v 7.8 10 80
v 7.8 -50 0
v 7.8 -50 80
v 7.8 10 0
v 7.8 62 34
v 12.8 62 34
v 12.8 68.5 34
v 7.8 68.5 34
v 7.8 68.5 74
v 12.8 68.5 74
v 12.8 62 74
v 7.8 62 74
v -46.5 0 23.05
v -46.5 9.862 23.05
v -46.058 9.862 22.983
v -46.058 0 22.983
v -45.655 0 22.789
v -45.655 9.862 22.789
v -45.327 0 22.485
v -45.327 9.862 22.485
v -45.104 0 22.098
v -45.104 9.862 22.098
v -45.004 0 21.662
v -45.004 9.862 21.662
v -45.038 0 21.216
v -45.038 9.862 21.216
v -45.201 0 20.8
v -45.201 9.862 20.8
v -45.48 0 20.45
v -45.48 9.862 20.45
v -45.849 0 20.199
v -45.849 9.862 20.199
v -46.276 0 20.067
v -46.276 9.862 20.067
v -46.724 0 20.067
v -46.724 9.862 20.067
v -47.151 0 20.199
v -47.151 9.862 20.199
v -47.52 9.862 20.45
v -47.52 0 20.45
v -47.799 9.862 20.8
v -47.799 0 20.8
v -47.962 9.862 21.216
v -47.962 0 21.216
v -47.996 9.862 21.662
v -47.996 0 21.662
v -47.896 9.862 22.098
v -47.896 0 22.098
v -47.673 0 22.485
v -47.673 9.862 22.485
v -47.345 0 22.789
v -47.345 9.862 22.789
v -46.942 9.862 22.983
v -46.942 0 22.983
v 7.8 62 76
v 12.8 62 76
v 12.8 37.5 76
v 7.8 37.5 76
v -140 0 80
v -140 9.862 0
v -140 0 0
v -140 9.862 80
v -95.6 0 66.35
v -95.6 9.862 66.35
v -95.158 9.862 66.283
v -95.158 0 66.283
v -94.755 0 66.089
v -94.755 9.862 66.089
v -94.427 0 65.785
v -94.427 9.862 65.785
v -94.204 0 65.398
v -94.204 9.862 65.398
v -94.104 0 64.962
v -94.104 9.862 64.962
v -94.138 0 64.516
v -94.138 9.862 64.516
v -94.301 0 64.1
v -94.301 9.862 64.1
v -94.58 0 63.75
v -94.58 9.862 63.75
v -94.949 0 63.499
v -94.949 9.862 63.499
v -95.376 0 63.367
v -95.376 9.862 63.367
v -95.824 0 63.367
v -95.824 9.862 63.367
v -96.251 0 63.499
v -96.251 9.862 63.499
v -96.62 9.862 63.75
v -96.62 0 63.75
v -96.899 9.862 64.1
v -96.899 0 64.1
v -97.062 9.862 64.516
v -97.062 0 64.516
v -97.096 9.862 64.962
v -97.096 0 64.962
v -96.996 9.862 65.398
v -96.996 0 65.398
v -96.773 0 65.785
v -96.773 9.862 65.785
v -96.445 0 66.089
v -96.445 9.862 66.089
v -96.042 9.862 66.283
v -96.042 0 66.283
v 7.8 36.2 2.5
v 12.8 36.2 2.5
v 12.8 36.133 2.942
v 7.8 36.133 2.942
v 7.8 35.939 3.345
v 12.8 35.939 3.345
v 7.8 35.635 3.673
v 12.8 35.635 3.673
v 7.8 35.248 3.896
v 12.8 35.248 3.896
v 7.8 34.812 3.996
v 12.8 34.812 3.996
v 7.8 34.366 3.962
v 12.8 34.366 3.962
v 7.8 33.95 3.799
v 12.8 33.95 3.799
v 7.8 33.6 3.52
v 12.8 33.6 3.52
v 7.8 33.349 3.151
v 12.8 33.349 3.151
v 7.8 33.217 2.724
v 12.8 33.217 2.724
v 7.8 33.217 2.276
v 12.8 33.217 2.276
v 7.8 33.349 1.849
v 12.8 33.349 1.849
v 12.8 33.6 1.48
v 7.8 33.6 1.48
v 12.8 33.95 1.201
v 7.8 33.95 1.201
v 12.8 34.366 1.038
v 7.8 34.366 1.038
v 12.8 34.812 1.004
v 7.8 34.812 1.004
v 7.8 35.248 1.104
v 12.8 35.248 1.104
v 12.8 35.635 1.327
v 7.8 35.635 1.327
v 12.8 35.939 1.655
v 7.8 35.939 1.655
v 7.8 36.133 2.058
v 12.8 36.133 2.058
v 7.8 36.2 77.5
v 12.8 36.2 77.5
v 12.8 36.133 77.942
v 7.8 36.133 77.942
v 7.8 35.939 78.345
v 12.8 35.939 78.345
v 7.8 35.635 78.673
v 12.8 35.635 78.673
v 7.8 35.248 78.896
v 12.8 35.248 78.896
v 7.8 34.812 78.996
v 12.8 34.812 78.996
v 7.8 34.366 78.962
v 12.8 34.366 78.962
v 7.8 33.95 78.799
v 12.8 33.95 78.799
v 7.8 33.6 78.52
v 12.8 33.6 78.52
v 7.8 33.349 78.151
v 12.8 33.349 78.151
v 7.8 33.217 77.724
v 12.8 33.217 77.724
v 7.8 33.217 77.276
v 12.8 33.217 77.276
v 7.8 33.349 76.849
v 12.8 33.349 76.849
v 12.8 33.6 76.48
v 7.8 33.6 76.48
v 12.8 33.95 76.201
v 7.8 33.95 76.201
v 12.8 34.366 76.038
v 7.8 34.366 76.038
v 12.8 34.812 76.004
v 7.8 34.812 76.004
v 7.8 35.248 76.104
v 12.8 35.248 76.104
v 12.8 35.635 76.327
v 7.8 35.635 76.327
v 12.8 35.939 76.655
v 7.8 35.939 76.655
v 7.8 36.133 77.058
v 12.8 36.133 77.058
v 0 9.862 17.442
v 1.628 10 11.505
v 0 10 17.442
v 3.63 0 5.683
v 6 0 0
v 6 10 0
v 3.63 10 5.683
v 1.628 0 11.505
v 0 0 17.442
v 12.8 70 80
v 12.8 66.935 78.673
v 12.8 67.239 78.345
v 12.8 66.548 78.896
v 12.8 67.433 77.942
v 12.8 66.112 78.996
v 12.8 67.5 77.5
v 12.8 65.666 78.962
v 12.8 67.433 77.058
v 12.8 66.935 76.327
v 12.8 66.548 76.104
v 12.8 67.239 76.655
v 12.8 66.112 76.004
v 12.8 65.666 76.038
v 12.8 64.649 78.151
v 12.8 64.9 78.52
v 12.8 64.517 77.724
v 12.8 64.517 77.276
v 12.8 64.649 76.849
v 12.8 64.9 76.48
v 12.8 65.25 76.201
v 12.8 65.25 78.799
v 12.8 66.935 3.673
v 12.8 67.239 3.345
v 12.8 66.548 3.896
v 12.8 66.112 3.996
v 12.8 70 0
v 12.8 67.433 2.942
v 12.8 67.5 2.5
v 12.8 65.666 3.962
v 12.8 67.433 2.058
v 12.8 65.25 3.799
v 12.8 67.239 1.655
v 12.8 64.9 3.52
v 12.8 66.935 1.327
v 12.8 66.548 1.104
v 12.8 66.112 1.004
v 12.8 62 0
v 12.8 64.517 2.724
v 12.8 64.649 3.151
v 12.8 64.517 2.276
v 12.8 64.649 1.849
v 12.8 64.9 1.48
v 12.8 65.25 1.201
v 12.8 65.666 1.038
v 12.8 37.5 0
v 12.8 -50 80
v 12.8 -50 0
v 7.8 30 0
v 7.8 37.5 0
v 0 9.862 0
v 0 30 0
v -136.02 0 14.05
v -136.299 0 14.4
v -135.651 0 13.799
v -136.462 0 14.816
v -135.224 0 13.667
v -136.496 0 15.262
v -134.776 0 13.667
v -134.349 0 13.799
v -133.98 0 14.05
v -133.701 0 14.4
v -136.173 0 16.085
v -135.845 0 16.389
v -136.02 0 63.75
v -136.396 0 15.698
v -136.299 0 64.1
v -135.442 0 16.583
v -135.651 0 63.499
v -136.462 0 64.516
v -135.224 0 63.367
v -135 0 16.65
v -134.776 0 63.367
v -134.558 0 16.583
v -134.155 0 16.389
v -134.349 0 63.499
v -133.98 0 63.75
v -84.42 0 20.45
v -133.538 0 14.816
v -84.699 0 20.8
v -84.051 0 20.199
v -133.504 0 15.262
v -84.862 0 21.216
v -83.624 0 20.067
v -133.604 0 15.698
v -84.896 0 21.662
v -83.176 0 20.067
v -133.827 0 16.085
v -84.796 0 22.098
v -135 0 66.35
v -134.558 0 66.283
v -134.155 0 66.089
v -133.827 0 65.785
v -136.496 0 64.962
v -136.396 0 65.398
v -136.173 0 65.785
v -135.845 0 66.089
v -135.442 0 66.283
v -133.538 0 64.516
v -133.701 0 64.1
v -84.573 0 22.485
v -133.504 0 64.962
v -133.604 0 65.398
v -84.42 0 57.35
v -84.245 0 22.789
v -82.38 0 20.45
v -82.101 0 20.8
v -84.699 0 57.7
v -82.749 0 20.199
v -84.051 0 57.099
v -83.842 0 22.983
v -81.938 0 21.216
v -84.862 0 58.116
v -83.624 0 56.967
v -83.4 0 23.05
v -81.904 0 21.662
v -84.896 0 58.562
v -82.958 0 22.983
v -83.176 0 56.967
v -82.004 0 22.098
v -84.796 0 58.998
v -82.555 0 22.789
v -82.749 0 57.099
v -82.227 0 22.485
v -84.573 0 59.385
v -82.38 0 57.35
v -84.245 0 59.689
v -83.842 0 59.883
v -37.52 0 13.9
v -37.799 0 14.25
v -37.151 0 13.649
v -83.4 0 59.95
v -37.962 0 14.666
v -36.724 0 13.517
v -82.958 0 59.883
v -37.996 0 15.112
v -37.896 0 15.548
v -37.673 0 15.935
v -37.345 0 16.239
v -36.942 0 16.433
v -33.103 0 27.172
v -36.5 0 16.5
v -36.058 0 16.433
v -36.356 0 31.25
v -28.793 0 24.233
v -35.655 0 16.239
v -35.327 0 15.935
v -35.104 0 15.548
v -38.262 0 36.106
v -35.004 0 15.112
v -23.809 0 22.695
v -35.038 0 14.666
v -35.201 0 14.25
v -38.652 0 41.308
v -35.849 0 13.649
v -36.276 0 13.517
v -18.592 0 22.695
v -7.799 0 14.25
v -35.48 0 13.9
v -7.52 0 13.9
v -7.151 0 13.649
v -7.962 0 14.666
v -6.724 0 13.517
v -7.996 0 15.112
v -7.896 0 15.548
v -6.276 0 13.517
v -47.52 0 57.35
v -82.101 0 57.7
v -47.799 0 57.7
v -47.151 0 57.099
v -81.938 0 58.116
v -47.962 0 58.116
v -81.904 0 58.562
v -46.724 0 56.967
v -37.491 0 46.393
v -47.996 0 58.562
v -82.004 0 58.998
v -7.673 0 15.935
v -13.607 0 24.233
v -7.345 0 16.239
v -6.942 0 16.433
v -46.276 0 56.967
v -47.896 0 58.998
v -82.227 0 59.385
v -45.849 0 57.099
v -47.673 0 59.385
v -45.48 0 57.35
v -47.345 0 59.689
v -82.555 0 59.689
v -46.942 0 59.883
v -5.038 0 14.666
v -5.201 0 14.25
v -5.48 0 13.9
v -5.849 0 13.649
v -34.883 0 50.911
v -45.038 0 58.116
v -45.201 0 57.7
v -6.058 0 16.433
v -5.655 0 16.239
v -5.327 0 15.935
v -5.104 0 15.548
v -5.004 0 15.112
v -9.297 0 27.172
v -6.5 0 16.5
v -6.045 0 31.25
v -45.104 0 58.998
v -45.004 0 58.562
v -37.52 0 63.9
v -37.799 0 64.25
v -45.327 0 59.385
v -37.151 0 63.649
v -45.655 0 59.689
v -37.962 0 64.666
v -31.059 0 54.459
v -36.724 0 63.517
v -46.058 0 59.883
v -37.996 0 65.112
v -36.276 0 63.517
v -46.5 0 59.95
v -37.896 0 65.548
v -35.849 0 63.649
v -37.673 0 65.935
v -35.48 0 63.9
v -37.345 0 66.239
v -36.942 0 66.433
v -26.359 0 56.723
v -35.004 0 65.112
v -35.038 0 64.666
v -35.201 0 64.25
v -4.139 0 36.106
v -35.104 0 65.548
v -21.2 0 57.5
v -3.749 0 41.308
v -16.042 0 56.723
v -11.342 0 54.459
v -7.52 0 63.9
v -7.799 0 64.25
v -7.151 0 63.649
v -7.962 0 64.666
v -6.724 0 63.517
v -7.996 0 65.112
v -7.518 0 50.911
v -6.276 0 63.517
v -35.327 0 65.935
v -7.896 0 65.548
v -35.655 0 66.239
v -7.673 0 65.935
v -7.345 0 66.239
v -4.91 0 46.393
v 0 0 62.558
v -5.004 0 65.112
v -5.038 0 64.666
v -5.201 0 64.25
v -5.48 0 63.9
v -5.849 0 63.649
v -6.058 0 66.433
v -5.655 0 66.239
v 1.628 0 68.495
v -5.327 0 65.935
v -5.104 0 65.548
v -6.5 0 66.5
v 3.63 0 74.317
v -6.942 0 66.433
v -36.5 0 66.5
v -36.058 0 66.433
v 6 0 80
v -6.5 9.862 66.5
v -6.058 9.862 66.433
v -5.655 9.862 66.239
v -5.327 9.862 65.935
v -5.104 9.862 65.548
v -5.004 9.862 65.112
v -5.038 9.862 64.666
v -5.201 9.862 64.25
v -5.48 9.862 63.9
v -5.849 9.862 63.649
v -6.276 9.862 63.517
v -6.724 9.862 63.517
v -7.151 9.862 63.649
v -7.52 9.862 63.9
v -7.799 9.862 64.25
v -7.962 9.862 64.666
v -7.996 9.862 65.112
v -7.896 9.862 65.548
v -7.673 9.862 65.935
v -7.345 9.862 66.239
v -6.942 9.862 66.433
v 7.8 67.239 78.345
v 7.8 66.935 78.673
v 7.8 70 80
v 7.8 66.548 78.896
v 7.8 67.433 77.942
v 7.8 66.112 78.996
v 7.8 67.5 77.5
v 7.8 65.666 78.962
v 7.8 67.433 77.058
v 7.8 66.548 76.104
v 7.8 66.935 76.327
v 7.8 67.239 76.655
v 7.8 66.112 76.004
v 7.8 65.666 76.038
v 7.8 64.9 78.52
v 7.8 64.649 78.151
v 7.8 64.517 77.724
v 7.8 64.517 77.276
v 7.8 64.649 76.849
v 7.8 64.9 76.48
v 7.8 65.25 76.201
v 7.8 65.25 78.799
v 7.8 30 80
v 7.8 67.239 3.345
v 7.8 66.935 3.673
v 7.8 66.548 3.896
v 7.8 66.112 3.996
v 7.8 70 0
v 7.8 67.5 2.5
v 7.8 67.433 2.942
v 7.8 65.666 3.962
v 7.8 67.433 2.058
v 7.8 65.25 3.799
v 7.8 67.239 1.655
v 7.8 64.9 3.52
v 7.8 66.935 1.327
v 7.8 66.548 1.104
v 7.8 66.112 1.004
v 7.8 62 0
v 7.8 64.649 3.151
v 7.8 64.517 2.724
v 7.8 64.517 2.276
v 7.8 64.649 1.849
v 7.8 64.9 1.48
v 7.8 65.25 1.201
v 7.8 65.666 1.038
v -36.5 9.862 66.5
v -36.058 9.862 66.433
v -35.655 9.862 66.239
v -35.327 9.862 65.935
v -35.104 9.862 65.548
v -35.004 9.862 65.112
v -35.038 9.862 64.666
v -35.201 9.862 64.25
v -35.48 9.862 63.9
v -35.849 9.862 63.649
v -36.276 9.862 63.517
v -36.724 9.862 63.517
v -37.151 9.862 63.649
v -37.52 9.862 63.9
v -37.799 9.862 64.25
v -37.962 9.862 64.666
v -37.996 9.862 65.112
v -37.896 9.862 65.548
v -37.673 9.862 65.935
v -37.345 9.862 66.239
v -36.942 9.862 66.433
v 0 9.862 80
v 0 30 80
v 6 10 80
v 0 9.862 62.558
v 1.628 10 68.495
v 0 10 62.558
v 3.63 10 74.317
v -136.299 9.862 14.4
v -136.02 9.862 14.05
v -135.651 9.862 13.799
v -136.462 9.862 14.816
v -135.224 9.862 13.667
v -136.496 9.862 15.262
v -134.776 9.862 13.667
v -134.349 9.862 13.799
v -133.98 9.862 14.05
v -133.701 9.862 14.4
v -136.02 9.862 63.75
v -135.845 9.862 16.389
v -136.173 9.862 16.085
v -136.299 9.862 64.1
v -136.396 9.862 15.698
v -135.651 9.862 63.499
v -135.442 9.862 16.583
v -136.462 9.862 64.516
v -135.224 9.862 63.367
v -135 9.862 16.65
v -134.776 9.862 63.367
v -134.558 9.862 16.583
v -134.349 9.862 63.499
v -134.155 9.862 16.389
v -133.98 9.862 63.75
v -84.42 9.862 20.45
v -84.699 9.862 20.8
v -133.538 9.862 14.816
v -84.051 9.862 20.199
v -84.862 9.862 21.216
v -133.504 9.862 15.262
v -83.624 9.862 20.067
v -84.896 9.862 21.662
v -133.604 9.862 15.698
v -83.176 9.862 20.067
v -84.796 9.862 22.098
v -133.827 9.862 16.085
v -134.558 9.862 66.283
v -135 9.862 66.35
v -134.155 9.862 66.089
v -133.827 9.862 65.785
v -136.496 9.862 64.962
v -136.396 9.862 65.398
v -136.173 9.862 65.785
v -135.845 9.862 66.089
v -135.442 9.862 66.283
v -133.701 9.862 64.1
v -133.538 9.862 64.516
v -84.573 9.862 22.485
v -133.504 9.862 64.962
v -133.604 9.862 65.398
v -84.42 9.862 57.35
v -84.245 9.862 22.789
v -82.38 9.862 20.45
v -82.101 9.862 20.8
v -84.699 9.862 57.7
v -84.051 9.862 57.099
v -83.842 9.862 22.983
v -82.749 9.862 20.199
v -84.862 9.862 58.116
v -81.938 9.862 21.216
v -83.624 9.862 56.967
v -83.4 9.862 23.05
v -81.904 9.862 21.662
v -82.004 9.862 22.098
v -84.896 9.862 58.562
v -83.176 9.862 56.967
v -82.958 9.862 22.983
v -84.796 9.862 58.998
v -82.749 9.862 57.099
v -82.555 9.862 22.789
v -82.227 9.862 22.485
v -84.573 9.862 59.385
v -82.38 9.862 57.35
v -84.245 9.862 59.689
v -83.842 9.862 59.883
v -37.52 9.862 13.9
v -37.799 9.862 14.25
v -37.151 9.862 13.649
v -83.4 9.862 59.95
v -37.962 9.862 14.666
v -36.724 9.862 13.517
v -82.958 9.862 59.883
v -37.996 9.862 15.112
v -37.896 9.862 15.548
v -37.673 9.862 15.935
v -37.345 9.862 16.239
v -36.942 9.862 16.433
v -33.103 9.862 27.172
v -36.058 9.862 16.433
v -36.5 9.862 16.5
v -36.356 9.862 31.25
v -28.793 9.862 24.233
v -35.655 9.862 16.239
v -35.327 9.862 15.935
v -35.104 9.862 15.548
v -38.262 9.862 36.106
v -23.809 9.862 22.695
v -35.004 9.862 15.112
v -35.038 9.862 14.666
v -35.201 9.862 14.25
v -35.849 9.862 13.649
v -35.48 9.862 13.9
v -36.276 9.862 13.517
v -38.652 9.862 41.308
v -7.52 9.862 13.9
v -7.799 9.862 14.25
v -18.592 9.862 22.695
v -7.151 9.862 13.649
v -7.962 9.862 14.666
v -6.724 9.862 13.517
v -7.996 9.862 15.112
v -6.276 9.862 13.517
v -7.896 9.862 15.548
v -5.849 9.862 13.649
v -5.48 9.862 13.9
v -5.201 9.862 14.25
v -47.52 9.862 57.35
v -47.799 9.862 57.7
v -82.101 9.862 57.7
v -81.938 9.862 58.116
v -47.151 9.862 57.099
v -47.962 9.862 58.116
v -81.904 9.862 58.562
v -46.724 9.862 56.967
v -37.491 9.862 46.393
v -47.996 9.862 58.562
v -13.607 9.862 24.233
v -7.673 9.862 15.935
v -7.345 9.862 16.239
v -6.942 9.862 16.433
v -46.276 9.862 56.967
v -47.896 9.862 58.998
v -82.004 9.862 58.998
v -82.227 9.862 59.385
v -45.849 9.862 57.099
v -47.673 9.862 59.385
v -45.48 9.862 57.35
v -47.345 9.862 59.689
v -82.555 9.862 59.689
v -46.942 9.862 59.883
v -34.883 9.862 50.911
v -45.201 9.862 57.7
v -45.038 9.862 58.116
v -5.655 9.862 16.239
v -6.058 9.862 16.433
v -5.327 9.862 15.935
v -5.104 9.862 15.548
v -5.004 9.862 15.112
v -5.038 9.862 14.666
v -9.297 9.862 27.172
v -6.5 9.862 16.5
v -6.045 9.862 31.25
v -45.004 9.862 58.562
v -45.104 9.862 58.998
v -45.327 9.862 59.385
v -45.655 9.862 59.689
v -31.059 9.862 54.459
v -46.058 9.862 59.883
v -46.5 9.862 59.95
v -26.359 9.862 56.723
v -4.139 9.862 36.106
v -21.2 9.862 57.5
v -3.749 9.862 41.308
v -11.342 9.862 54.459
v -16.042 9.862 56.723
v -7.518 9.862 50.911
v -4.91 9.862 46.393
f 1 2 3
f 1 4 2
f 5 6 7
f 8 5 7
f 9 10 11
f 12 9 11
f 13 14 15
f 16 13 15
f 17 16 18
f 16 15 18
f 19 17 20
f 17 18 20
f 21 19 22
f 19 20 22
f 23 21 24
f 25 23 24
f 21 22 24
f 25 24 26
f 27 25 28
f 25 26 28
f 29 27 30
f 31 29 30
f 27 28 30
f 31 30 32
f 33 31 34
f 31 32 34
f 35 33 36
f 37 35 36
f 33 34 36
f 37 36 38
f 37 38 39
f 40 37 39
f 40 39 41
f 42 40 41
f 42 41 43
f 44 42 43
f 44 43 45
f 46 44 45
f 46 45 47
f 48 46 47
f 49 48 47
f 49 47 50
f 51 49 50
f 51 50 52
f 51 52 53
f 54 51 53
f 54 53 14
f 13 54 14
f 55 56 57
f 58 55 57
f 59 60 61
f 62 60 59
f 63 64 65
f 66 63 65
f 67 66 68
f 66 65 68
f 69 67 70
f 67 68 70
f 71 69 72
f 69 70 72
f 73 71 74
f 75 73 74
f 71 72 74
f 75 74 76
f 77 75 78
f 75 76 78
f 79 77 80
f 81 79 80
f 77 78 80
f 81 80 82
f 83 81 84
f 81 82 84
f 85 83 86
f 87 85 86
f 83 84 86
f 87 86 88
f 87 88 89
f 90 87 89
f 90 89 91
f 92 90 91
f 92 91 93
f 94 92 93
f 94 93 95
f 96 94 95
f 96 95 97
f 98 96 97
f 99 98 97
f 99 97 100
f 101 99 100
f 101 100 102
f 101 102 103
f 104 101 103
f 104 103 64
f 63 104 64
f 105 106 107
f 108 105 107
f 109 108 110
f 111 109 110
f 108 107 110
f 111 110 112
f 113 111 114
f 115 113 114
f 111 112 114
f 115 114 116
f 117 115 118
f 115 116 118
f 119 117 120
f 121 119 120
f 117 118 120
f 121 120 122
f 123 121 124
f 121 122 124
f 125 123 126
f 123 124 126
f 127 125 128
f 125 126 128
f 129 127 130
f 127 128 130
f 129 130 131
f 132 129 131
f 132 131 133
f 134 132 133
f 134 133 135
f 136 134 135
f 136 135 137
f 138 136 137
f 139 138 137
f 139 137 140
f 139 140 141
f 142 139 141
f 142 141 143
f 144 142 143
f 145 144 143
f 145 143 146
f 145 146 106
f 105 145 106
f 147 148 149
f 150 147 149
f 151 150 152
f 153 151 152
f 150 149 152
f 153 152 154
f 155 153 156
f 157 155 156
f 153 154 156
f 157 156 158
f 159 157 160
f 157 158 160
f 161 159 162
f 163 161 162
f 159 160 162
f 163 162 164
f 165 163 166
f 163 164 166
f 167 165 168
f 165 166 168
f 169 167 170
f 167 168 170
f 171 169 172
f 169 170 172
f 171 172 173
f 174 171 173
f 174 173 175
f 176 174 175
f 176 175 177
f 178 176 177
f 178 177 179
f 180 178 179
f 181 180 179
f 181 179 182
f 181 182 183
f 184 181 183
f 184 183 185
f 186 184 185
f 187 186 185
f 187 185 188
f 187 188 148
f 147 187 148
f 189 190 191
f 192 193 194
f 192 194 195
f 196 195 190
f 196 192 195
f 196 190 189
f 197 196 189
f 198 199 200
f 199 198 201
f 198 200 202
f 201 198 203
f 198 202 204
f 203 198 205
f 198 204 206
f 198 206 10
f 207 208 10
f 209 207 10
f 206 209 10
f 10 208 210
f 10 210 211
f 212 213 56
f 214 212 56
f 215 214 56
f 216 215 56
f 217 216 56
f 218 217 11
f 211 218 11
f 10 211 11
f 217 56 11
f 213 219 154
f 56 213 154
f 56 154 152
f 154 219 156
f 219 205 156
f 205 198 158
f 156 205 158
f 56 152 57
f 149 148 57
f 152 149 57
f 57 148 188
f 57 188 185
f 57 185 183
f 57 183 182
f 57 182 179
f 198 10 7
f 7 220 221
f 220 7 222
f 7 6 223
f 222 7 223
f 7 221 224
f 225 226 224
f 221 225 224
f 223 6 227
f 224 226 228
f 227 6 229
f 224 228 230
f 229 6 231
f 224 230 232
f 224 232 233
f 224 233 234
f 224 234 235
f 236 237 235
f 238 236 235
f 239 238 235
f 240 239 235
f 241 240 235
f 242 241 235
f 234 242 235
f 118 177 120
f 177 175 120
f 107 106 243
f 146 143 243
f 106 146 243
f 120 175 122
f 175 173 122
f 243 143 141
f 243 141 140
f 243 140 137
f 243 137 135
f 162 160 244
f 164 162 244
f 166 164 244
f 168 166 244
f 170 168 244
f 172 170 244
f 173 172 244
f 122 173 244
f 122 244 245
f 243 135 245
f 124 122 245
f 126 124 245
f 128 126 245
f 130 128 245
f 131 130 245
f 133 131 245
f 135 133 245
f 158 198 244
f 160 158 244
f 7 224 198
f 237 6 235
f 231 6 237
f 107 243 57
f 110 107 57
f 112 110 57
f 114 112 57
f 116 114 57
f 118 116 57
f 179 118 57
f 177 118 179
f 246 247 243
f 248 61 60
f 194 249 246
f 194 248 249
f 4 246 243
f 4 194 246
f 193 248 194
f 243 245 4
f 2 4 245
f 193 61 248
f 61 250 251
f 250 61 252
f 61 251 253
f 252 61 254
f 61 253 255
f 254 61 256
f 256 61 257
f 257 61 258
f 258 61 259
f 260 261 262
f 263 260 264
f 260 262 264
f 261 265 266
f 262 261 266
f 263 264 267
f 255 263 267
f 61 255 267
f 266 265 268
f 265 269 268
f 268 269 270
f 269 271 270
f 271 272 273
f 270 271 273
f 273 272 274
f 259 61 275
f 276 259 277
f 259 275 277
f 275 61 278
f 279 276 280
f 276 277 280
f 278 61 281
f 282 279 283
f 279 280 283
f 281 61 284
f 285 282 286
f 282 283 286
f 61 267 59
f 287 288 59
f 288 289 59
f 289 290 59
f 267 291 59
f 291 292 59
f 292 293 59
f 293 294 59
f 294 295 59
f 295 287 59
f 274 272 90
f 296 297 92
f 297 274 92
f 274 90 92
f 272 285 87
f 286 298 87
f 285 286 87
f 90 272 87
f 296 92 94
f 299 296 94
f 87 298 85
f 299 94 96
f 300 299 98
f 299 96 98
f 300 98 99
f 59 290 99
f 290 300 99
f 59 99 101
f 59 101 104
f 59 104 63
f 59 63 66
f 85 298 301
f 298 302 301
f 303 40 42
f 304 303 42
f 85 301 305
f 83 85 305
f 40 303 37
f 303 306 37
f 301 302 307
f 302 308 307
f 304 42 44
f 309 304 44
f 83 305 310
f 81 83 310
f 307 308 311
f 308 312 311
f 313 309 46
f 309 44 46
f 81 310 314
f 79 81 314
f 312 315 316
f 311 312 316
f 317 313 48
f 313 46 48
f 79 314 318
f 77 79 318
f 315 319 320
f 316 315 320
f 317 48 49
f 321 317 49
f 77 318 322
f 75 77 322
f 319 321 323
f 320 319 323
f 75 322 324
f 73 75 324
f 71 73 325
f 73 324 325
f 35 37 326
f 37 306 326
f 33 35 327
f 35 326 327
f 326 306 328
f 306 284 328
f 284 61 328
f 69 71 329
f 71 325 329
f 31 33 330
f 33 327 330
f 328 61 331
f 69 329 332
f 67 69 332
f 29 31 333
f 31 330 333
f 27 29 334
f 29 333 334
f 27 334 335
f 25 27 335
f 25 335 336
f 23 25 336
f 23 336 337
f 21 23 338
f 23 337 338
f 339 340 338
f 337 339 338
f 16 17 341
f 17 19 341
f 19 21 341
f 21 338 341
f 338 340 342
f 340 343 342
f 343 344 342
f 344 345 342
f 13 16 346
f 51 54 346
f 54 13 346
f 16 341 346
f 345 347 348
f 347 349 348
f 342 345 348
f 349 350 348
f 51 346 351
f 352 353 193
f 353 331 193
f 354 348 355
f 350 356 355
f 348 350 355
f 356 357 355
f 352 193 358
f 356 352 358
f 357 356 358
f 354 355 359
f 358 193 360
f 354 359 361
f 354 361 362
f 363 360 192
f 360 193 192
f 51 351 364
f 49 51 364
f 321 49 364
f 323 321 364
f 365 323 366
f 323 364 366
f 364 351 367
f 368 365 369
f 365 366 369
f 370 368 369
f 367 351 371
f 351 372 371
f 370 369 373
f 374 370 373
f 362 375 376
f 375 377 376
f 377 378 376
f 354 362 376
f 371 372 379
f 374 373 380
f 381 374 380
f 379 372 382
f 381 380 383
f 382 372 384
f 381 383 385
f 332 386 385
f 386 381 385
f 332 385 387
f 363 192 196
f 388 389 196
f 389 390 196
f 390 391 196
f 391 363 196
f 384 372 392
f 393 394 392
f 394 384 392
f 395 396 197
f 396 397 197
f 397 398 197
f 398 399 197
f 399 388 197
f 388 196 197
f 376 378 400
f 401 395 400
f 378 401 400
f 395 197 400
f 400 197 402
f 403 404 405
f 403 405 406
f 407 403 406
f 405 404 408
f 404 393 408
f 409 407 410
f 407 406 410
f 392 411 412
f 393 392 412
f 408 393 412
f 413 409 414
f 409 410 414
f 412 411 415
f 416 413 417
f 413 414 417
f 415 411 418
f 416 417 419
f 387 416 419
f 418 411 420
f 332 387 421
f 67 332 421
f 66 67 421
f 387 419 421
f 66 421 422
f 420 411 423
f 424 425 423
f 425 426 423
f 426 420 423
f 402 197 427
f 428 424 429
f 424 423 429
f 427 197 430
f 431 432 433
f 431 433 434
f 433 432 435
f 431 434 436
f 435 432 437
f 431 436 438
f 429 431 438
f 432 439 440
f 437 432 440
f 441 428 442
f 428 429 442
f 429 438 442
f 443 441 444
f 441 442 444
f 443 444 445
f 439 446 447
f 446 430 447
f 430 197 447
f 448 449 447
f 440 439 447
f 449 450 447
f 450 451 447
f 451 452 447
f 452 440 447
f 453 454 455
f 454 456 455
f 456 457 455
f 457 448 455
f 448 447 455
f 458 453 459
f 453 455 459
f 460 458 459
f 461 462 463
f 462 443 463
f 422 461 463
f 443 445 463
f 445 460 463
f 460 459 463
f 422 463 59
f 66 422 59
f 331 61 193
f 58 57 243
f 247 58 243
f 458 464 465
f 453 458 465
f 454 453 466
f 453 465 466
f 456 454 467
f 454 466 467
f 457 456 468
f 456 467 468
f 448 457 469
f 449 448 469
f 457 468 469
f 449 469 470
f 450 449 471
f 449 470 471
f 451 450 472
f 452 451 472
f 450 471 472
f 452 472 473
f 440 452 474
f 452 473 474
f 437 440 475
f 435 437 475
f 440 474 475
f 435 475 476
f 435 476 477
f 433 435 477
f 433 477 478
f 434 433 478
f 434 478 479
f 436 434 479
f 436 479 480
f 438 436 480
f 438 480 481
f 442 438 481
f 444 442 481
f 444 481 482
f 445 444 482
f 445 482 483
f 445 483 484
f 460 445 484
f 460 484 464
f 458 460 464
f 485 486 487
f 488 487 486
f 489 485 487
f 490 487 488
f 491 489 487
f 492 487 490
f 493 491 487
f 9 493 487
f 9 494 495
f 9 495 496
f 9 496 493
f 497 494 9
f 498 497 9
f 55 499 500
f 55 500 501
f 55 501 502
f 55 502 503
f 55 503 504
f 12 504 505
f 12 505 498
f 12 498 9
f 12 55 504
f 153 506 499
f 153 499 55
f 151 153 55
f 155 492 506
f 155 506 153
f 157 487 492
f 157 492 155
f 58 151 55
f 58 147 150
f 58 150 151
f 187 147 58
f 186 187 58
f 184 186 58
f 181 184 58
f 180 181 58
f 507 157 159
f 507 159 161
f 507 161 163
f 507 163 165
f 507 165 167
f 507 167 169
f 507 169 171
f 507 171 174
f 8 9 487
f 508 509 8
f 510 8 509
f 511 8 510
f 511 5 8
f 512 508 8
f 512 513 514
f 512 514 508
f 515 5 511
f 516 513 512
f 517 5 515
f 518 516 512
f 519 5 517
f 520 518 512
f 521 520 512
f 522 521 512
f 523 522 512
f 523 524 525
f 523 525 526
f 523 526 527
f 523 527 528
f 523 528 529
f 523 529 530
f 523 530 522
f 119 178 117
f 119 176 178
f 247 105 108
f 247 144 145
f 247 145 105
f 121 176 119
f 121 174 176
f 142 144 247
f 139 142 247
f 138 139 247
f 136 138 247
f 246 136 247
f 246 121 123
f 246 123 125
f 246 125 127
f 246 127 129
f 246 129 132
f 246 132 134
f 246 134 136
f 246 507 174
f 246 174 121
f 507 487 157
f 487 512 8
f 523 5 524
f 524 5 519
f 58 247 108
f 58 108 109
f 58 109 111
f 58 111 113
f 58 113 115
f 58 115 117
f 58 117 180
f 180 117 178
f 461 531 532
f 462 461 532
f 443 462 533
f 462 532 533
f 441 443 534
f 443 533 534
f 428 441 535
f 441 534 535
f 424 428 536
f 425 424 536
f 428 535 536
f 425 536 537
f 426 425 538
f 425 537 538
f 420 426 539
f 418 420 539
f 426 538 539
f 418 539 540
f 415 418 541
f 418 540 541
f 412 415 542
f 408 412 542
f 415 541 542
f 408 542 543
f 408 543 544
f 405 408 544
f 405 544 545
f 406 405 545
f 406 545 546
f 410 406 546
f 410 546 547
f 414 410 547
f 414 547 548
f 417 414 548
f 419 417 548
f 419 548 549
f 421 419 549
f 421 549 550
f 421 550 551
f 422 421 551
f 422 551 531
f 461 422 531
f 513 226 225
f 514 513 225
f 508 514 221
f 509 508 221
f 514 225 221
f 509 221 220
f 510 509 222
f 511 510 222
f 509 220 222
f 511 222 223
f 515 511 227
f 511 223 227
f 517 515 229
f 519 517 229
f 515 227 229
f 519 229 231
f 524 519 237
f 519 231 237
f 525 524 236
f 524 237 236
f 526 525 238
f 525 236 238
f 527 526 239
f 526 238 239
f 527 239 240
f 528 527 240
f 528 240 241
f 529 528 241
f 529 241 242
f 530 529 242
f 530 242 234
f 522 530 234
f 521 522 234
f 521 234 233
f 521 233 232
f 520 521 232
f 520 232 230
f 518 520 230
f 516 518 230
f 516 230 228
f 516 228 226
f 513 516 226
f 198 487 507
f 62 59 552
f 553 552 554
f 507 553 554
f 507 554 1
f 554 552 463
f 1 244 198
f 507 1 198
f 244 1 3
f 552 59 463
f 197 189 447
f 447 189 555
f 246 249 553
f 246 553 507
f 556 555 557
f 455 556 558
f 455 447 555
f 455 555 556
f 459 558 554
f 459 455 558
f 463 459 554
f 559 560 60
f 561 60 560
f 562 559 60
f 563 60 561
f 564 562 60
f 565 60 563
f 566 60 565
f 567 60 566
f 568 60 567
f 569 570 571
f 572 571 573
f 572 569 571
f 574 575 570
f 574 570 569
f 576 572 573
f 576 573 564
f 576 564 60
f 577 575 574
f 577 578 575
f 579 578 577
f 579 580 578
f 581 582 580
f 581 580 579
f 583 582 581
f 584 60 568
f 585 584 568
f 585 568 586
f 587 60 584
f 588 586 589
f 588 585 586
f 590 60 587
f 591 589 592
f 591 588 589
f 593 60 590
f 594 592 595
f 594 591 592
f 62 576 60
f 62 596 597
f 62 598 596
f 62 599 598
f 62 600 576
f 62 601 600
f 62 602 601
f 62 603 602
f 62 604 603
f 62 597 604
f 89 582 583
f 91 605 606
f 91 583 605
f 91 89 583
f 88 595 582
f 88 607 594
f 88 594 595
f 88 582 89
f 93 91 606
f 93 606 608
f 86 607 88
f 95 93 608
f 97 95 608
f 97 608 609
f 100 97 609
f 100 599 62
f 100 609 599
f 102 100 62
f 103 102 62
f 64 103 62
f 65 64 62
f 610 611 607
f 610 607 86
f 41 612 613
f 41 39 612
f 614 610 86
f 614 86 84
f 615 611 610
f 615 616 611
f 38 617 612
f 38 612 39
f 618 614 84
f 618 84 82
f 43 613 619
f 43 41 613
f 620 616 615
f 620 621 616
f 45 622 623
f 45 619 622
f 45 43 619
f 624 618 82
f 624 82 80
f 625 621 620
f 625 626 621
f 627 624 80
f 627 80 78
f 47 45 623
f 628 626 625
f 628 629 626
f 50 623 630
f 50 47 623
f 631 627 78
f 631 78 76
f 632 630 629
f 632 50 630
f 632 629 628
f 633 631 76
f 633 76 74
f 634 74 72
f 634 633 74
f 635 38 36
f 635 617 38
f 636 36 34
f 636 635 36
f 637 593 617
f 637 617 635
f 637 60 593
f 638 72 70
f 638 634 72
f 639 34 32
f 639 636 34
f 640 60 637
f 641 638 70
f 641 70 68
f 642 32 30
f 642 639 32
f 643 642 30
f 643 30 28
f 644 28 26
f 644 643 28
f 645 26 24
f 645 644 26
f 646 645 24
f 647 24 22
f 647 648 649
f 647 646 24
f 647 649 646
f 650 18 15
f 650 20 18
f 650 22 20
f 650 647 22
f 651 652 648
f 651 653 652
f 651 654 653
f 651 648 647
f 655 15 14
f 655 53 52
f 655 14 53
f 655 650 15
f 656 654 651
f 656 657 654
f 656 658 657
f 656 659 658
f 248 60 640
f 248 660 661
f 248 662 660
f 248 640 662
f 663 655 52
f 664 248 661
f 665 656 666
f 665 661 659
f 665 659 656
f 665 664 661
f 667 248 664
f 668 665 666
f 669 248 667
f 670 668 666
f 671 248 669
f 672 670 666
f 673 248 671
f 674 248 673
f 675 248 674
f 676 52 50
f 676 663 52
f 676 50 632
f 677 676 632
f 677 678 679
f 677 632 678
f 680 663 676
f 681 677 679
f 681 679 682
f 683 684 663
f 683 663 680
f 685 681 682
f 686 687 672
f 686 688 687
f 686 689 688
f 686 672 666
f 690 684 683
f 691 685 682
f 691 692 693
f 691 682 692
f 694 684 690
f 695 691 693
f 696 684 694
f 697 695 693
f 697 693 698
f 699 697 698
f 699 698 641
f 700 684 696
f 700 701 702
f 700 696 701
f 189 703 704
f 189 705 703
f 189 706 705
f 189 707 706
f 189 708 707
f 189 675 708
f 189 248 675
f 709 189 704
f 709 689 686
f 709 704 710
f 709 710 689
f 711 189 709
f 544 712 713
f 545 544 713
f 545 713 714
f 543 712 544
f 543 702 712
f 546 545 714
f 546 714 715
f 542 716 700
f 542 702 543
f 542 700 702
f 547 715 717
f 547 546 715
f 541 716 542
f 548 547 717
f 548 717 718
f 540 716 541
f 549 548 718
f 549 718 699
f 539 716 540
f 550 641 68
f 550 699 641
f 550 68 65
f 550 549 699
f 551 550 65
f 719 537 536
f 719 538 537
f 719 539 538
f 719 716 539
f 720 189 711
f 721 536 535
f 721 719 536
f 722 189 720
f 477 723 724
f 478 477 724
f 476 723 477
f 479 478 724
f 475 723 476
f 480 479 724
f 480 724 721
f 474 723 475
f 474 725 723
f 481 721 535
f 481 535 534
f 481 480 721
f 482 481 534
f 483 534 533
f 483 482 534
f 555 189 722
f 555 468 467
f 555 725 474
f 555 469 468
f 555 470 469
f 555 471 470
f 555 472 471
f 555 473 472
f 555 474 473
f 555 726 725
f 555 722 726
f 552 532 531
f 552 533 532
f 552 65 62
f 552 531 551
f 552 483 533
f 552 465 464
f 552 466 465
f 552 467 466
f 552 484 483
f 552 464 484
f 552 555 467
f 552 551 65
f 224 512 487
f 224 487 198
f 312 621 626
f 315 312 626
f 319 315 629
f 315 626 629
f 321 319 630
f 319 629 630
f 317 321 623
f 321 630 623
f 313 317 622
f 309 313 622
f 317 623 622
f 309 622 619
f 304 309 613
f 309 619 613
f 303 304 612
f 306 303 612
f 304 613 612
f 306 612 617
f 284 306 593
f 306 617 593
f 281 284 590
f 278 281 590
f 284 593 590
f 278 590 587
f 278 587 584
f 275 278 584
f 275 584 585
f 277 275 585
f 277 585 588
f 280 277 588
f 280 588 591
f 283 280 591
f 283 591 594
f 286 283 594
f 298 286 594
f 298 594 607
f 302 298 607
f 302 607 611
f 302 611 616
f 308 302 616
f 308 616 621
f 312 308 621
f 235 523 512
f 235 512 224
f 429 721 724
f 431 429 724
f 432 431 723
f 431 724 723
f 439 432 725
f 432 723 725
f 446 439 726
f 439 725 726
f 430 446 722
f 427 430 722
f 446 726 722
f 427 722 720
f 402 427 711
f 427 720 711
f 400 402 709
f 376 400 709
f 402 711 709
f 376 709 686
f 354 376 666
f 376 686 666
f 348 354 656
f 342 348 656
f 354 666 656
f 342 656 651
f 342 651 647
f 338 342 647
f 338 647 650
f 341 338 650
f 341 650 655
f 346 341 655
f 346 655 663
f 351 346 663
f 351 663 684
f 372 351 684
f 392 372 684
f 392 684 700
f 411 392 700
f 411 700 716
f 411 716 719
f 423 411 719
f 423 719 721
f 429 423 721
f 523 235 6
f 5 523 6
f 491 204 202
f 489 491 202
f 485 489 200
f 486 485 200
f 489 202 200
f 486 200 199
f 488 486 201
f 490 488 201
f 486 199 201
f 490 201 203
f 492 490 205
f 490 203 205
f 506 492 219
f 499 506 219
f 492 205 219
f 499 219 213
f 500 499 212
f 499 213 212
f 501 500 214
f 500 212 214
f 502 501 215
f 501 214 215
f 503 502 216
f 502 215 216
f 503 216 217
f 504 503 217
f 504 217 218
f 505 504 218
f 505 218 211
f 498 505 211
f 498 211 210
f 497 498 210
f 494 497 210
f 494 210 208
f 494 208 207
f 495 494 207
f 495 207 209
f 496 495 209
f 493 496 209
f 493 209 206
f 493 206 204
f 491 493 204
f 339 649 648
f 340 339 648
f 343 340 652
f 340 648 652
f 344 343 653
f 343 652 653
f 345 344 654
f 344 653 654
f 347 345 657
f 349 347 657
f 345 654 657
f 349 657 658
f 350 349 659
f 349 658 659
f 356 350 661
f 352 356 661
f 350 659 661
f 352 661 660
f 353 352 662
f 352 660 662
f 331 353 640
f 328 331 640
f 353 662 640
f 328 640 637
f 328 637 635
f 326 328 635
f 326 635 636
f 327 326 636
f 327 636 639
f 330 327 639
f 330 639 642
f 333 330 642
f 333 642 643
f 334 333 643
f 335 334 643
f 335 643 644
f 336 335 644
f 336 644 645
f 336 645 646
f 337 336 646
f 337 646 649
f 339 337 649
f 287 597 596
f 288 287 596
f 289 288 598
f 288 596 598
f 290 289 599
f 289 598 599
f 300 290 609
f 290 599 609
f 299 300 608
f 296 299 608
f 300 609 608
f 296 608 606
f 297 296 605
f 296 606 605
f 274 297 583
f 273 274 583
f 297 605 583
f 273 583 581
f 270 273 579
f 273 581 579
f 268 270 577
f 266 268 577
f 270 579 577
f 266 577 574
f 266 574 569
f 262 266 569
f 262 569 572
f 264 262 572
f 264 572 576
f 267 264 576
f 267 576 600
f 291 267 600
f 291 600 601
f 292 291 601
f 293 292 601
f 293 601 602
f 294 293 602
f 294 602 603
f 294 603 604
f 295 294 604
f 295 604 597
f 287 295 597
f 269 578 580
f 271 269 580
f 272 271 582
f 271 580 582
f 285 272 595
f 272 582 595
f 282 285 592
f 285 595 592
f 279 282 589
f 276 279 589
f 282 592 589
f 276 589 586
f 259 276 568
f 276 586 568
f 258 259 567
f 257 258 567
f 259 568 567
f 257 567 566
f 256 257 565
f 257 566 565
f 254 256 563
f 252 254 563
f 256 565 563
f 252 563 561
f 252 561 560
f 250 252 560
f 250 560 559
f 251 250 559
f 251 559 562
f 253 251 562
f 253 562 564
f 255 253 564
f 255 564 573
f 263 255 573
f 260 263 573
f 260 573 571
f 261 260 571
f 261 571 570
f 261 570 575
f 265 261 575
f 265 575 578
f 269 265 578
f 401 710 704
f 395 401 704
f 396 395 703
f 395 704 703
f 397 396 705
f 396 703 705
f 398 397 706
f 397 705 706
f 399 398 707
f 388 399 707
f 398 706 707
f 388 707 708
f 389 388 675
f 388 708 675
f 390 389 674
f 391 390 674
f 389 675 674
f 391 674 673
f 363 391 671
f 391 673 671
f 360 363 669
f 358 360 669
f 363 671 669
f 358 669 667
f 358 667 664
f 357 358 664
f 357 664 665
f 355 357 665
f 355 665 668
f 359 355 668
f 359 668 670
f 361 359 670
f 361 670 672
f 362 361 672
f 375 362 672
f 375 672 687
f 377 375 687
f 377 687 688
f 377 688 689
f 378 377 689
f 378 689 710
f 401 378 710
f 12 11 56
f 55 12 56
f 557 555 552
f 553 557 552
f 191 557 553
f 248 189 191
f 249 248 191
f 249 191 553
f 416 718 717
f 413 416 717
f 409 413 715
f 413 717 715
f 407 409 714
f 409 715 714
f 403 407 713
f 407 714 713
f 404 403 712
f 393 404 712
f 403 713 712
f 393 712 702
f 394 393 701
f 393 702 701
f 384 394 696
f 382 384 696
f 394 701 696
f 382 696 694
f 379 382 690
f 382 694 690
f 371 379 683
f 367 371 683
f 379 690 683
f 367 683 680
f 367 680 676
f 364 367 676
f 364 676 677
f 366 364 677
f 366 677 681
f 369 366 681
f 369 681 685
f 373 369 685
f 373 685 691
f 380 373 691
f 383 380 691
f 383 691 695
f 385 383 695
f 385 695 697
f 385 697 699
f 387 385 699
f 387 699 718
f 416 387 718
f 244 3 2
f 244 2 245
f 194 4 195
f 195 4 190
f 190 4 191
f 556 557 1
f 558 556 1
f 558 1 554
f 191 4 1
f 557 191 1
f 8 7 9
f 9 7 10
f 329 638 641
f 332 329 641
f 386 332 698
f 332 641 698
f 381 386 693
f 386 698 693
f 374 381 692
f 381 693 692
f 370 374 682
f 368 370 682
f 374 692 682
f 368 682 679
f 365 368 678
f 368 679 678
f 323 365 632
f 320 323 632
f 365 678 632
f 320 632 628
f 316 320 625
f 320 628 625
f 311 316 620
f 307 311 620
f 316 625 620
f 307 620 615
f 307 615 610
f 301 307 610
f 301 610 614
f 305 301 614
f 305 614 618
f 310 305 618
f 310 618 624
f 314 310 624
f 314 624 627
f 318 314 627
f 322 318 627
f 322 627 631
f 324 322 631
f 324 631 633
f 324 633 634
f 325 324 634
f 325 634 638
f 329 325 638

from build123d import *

# Parameters (mm, degrees)
BOSS_EXTRUDE1_DEPTH   = 80
CORTE_EXTRUS_O1_DEPTH = 10
SKETCH3_W             = 5
SKETCH3_H             = 80
BOSS_EXTRUDE2_DEPTH   = 50
SKETCH4_W             = 80
SKETCH4_H             = 9.86245083
BOSS_EXTRUDE3_DEPTH   = 140
SKETCH5_R             = 1.5
SKETCH5_R_2           = 17.5
CUT_EXTRUDE1_DEPTH    = 40
SKETCH6_W             = 5
SKETCH6_H             = 80
BOSS_EXTRUDE4_DEPTH   = 40
SKETCH7_R             = 1.5
CUT_EXTRUDE2_DEPTH    = 40


with BuildPart() as part:
    # Sketch1 → Boss-Extrude1 (new body)
    with BuildSketch(Plane.XY):
        Polygon((0, 0), (0, 30), (12.8, 30), (12.8, 0), (7.8, 0), (7.8, 10), (6, 10), (6, 0), align=None)
    extrude(amount=BOSS_EXTRUDE1_DEPTH)

    # Esboço2 → Corte-extrusão1 (cut)
    with BuildSketch(Plane.XZ):
        with BuildLine():
            Line((6, 80), (6, 0))
            ThreePointArc((6, 0), (-2.670710227, 40), (6, 80))
        make_face()
    extrude(amount=-CORTE_EXTRUS_O1_DEPTH, mode=Mode.SUBTRACT)

    # Sketch3 → Boss-Extrude2 (add)
    with BuildSketch(Plane.XZ):
        with Locations((10.3, 40)):
            Rectangle(SKETCH3_W, SKETCH3_H)
    extrude(amount=BOSS_EXTRUDE2_DEPTH)

    # Sketch4 → Boss-Extrude3 (add)
    with BuildSketch(Plane.ZY):
        with Locations((40, 4.931225415)):
            Rectangle(SKETCH4_W, SKETCH4_H)
    extrude(amount=BOSS_EXTRUDE3_DEPTH)

    # Sketch5 → Cut-Extrude1 (cut)
    with BuildSketch(Plane(origin=(0, 9.86245083, 0), x_dir=(1, 0, 0), z_dir=(0, 1, 0))):
        with Locations(Location((-6.5, -65, 0), (0, 0, 270))):
            Circle(SKETCH5_R)
        with Locations(Location((-36.5, -65, 0), (0, 0, 270))):
            Circle(SKETCH5_R)
        with Locations(Location((-6.5, -15, 0), (0, 0, 270))):
            Circle(SKETCH5_R)
        with Locations(Location((-36.5, -15, 0), (0, 0, 270))):
            Circle(SKETCH5_R)
        with Locations(Location((-21.200454255, -40, 0), (0, 0, 270))):
            Circle(SKETCH5_R_2)
        with Locations(Location((-46.5, -21.55, 0), (0, 0, 270))):
            Circle(SKETCH5_R)
        with Locations(Location((-46.5, -58.45, 0), (0, 0, 270))):
            Circle(SKETCH5_R)
        with Locations(Location((-83.4, -21.55, 0), (0, 0, 270))):
            Circle(SKETCH5_R)
        with Locations(Location((-83.4, -58.45, 0), (0, 0, 270))):
            Circle(SKETCH5_R)
        with Locations(Location((-95.6, -64.85, 0), (0, 0, 270))):
            Circle(SKETCH5_R)
        with Locations(Location((-135, -64.85, 0), (0, 0, 270))):
            Circle(SKETCH5_R)
        with Locations(Location((-135, -15.15, 0), (0, 0, 270))):
            Circle(SKETCH5_R)
    extrude(amount=-CUT_EXTRUDE1_DEPTH, mode=Mode.SUBTRACT)

    # Sketch6 → Boss-Extrude4 (add)
    with BuildSketch(Plane(origin=(0, 30, 0), x_dir=(1, 0, 0), z_dir=(0, 1, 0))):
        with Locations((10.3, -40)):
            Rectangle(SKETCH6_W, SKETCH6_H)
    extrude(amount=BOSS_EXTRUDE4_DEPTH)

    # Sketch7 → Cut-Extrude2 (cut)
    with BuildSketch(Plane(origin=(12.8, 0, 0), x_dir=(0, 0, -1), z_dir=(1, 0, 0))):
        with Locations(Location((-77.5, 66, 0), (0, 0, 90))):
            Circle(SKETCH7_R)
        with Locations(Location((-2.5, 66, 0), (0, 0, 90))):
            Circle(SKETCH7_R)
        with Locations(Location((-2.5, 34.7, 0), (0, 0, 90))):
            Circle(SKETCH7_R)
        with Locations(Location((-77.5, 34.7, 0), (0, 0, 90))):
            Circle(SKETCH7_R)
        Polygon((-74, 68.5), (-74, 62), (-76, 62), (-76, 37.5), (0, 37.5), (0, 62), (-34, 62), (-34, 68.5), align=None)
    extrude(amount=-CUT_EXTRUDE2_DEPTH, mode=Mode.SUBTRACT)


solid = part.part
